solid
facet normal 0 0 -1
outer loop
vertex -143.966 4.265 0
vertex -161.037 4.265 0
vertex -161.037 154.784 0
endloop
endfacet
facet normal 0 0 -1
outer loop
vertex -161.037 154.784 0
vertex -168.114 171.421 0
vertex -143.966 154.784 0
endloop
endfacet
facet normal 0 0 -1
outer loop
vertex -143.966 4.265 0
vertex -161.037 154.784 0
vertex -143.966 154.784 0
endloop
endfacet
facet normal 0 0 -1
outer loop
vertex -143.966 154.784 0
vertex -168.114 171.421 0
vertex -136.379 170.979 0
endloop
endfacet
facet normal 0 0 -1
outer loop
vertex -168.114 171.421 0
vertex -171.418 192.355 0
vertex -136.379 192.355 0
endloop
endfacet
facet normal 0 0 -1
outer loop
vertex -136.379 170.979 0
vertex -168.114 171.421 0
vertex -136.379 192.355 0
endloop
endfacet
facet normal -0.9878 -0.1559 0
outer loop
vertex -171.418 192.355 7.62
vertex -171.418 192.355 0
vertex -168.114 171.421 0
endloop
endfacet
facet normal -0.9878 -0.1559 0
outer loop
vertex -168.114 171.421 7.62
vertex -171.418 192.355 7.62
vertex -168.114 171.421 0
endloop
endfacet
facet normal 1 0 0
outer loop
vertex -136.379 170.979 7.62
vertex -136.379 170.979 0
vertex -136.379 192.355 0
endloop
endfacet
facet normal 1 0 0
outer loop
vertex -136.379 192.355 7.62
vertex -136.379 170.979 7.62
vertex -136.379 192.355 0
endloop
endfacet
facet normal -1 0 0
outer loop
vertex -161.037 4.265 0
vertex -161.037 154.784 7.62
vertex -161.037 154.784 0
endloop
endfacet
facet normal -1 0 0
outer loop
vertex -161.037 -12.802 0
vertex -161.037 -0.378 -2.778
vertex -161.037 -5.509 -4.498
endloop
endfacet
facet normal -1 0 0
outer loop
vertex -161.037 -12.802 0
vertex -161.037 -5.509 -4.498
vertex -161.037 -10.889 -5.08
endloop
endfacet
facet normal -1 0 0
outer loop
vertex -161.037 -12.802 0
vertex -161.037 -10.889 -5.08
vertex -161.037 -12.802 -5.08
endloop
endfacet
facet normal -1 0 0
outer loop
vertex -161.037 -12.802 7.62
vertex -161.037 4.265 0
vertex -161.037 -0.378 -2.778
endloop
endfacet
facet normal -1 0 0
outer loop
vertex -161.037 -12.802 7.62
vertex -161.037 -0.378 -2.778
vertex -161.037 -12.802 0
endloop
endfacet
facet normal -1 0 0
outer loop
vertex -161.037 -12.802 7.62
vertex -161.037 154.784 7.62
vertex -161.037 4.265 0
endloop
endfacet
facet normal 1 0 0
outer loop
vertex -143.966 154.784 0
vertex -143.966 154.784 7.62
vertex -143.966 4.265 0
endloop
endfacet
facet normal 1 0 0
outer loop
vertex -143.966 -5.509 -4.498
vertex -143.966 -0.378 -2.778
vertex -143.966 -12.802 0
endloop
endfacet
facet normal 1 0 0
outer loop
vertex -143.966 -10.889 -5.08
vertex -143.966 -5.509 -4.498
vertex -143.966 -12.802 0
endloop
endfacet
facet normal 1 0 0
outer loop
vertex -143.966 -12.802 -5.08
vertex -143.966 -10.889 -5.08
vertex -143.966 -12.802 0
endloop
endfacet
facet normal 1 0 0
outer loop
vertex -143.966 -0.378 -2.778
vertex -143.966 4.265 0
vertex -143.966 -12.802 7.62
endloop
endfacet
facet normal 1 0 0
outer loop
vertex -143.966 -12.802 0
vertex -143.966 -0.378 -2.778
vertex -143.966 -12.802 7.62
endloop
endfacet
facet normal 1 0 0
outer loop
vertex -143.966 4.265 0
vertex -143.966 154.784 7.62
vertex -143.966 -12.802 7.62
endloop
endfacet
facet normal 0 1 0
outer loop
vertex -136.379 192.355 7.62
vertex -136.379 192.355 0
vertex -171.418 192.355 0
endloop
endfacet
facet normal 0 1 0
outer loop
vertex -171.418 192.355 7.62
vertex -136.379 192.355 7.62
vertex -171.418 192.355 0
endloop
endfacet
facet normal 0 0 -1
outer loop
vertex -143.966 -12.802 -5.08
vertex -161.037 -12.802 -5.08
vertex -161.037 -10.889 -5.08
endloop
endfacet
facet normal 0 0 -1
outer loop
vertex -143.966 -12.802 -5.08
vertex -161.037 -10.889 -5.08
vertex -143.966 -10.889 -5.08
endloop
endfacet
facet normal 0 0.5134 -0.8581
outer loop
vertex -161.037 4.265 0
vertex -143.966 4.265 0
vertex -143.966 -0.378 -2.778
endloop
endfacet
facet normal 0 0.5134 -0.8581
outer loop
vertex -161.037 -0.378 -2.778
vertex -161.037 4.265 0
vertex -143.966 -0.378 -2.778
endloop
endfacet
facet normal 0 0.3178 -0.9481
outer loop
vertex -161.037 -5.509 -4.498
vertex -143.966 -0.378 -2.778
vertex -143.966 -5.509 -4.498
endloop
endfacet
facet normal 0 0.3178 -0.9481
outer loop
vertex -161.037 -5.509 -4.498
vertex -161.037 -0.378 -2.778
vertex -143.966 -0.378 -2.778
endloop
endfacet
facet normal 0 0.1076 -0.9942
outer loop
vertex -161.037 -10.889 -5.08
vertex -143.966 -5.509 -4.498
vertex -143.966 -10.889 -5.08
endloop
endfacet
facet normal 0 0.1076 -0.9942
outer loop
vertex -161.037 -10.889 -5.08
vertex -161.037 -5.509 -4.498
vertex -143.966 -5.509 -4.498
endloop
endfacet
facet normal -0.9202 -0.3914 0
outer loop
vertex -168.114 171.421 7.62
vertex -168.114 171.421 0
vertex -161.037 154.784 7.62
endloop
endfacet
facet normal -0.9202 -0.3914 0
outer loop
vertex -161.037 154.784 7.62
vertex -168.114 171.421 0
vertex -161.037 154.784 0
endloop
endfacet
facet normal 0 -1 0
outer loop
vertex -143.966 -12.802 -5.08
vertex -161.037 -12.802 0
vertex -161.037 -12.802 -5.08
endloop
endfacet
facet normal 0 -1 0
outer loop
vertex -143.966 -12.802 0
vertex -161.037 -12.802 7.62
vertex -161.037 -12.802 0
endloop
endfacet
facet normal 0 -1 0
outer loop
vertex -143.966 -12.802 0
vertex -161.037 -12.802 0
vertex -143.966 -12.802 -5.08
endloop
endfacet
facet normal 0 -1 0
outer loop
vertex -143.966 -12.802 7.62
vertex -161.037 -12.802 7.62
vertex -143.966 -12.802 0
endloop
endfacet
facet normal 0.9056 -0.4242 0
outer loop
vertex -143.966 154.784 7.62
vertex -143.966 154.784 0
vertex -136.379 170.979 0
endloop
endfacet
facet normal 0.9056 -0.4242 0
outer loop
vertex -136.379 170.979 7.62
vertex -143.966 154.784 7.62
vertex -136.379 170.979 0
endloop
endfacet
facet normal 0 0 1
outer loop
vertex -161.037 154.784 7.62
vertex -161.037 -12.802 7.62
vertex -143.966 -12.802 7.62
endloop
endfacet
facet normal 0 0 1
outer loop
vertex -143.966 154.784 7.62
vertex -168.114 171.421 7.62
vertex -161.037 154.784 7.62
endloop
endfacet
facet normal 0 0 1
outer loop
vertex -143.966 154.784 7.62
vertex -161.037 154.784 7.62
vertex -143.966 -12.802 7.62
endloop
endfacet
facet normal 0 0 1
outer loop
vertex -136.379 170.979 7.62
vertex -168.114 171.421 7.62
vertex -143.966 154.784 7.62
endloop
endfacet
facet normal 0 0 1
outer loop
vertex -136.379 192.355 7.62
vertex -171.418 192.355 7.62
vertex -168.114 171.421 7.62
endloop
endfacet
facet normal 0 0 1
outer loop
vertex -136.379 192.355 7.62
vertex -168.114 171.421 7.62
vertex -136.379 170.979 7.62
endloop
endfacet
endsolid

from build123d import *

# Parameters (mm, degrees)
F0_W        = 17.0710533857
F0_H        = 167.5858162344
F1_DEPTH    = 7.62
F2_W        = 17.0710533857
F2_H        = 17.0666188933
F3_DEPTH    = 5.08
F4_T1_DEPTH = 92.8391963602


# Not quite as in the source:
# - a fillet or chamfer that OpenCascade refuses, or shapes differently, is made with other operations: its cross-section is extruded or revolved along the edge and cut away or added


with BuildPart() as f1:
    # F0 (on Top) → F1 (new body)
    with BuildSketch(Plane.XY):
        with Locations((-152.5016650558, 70.9913838655)):
            Rectangle(F0_W, F0_H)
        Polygon((-168.1138426065, 171.4205145836), (-161.0371917486, 154.7842919827), (-143.9661383629, 154.7842919827), (-136.3786160946, 170.9794849157), (-136.3786160946, 192.3550665379), (-171.417593956, 192.3550665379), align=None)
    extrude(amount=F1_DEPTH)

    # F2 (on face) → F3 (join)
    with BuildSketch(Plane(origin=(0, 0, 0), x_dir=(1, 0, 0), z_dir=(0, 0, -1))):
        with Locations((-152.5016650558, 4.2682148051)):
            Rectangle(F2_W, F2_H)
    extrude(amount=F3_DEPTH)

    # F4: fillet of radius 25.1416200386 on 1 edges, made by hand

    # F4_s2 → F4_t1 (cut)
    with BuildSketch(Plane.YZ.offset(-198.9212632358)):
        with BuildLine():
            ThreePointArc((4.2650946416, 0), (-2.8973065821, -3.7761932686), (-10.8885339533, -5.08))
            Line((-10.8885339533, -5.08), (-10.8885339533, -5.5828324008))
            Line((-10.8885339533, -5.5828324008), (4.2650946416, -5.5828324008))
            Line((4.2650946416, -5.5828324008), (4.7679270424, -5.08))
            ThreePointArc((4.7679270424, -5.08), (4.7679270424, -2.54), (4.5681672135, -0.4012324008))
            Line((4.5681672135, -0.4012324008), (4.2650946416, 0))
        make_face()
    extrude(amount=F4_T1_DEPTH, mode=Mode.SUBTRACT)


solid = f1.part
